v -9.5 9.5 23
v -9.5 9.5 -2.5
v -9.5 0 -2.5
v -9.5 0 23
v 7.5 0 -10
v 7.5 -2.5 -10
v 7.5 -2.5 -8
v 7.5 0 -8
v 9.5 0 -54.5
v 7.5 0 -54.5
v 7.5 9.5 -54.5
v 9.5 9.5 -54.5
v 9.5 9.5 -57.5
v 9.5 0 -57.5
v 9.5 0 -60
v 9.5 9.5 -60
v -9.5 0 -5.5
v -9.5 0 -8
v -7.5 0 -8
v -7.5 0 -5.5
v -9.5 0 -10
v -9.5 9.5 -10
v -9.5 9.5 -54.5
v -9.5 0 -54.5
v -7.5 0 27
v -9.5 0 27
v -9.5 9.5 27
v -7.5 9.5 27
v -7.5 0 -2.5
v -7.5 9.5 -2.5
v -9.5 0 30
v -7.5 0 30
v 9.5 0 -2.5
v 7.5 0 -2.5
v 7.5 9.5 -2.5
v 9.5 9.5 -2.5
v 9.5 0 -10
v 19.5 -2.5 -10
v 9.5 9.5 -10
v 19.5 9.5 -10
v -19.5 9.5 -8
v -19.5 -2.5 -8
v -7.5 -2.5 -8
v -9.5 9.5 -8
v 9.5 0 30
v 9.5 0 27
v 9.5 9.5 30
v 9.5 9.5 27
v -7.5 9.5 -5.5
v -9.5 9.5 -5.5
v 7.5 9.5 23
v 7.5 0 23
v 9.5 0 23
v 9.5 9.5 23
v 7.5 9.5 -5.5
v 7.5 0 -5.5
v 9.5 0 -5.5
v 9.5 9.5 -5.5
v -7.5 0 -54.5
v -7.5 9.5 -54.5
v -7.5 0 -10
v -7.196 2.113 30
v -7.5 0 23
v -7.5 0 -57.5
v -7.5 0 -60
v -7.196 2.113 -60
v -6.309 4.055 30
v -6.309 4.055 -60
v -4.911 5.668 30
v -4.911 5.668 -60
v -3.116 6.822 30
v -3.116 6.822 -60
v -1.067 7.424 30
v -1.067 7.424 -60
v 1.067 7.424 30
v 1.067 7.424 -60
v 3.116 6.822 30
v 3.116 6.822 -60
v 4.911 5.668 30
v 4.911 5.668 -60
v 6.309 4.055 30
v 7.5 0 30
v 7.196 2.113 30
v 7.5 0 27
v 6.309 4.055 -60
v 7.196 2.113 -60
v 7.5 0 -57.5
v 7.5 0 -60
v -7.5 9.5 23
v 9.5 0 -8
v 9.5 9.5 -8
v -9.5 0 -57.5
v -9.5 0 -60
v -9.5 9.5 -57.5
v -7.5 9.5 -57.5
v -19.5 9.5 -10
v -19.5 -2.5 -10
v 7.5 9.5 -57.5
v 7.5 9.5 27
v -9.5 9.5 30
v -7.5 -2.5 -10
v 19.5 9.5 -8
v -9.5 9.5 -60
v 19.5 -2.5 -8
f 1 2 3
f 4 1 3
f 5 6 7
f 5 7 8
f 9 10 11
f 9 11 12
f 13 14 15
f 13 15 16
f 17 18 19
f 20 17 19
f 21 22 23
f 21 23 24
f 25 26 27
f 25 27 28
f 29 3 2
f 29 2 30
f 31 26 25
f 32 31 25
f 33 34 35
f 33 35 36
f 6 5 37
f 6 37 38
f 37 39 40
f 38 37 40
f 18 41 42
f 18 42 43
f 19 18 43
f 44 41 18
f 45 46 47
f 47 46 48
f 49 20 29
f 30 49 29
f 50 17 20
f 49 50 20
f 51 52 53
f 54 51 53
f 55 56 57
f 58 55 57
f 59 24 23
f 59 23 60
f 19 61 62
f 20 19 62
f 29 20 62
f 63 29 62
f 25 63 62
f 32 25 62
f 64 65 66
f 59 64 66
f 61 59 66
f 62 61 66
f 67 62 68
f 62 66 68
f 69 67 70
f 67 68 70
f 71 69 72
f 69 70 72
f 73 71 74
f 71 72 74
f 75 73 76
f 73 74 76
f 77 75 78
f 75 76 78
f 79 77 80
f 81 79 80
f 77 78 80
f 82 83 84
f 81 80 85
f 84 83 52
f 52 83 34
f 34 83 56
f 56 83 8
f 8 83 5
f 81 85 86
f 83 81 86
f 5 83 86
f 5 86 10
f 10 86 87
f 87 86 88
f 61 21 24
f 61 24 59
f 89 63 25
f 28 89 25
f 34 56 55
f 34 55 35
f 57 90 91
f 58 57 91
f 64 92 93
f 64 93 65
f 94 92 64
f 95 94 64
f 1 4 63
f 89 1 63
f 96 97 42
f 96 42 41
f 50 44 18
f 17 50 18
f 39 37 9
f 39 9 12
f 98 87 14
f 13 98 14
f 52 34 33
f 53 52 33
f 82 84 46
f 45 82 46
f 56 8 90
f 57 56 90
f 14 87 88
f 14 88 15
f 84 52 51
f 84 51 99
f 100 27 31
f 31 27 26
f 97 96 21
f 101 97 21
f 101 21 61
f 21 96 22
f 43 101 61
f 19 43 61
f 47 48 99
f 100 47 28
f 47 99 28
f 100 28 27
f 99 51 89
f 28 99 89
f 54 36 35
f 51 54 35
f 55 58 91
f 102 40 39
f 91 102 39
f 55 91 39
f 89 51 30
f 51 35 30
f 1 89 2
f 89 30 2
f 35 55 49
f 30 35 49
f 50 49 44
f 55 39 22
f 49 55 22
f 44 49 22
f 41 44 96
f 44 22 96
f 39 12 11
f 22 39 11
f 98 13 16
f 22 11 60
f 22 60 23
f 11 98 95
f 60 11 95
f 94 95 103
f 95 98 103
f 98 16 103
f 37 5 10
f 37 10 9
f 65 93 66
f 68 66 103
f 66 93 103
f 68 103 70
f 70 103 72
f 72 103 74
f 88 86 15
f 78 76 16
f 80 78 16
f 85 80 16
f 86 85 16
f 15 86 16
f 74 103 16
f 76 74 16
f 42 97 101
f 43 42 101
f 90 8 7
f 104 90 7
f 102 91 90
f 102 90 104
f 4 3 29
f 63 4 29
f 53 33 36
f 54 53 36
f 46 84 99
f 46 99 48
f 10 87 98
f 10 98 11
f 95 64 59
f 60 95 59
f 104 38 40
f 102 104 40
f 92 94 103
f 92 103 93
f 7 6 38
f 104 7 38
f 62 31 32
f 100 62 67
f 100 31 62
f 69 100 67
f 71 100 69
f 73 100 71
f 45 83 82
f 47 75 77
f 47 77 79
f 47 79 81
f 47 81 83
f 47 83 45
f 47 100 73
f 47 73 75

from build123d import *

# Parameters (mm, degrees)
F1_DEPTH = 60
F3_W     = 12
F3_H     = 12
F4_DEPTH = 2
F5_DEPTH = 30
F6_W     = 2
F6_H     = 3
F6_H_2   = 4
F7_DEPTH = 9.501


with BuildPart() as f1:
    # F0 (on Top) → F1 (new body)
    with BuildSketch(Plane.XY):
        with BuildLine():
            Line((-9.5, 0), (-7.5, 0))
            ThreePointArc((-7.5, 0), (0, 7.5), (7.5, 0))
            Line((7.5, 0), (9.5, 0))
            Line((9.5, 0), (9.5, 9.5))
            Line((9.5, 9.5), (-9.5, 9.5))
            Line((-9.5, 9.5), (-9.5, 0))
        make_face()
    extrude(amount=-F1_DEPTH)

    # F3 (on offset) → F4 (join)
    with BuildSketch(Plane.XY.offset(-10)):
        with Locations((-13.5, 3.5)):
            Rectangle(F3_W, F3_H)
        with Locations((13.5, 3.5)):
            Rectangle(F3_W, F3_H)
    extrude(amount=F4_DEPTH)

    # F1_face (on face) → F5 (join)
    with BuildSketch(Plane(origin=(0, 6.25253, 0), x_dir=(1, 0, 0), z_dir=(0, 0, 1))):
        with BuildLine():
            Line((-9.5, -6.25253), (-7.5, -6.25253))
            ThreePointArc((-7.5, -6.25253), (0, 1.24747), (7.5, -6.25253))
            Line((7.5, -6.25253), (9.5, -6.25253))
            Line((9.5, -6.25253), (9.5, 3.24747))
            Line((9.5, 3.24747), (-9.5, 3.24747))
            Line((-9.5, 3.24747), (-9.5, -6.25253))
        make_face()
    extrude(amount=F5_DEPTH)

    # F6 (on face) → F7 (cut, through all)
    with BuildSketch(Plane.XZ):
        with Locations((-8.5, -4)):
            Rectangle(F6_W, F6_H)
        with Locations((-8.5, -56)):
            Rectangle(F6_W, F6_H)
        with Locations((8.5, -4)):
            Rectangle(F6_W, F6_H)
        with Locations((8.5, -56)):
            Rectangle(F6_W, F6_H)
        with Locations((-8.5, 25)):
            Rectangle(F6_W, F6_H_2)
        with Locations((8.5, 25)):
            Rectangle(F6_W, F6_H_2)
    extrude(amount=-F7_DEPTH, mode=Mode.SUBTRACT)


solid = f1.part
